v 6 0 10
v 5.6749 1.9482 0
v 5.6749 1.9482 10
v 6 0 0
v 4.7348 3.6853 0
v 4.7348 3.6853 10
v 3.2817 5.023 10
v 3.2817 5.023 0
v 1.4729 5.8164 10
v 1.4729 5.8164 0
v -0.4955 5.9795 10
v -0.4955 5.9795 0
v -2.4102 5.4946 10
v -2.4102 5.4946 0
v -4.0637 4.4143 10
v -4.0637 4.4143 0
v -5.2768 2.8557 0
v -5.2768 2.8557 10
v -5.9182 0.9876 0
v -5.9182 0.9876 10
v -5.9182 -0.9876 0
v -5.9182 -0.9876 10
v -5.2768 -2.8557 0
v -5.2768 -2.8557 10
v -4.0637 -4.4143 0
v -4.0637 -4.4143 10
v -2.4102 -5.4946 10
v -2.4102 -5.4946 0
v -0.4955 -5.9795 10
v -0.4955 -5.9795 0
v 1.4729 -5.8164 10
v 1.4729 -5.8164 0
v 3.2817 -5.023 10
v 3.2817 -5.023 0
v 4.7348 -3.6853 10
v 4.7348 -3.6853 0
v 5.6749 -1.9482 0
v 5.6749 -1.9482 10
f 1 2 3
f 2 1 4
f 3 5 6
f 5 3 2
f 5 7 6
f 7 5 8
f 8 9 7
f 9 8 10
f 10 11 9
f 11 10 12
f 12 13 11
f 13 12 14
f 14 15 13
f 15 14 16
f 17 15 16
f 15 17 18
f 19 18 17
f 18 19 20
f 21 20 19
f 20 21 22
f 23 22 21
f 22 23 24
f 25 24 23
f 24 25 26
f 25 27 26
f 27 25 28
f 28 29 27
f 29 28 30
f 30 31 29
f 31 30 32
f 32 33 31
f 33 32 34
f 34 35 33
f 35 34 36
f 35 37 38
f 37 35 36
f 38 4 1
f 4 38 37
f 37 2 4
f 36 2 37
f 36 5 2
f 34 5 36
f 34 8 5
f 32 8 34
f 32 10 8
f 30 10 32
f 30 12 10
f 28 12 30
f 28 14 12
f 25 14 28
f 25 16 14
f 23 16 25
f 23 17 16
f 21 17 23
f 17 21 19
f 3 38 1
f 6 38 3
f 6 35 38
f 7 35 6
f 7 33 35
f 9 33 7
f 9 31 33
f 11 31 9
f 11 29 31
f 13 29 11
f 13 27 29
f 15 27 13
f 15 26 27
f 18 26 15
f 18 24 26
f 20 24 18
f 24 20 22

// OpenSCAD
// Generated by generate_scads.py
cylinder(h=10, r=6, center=false);
